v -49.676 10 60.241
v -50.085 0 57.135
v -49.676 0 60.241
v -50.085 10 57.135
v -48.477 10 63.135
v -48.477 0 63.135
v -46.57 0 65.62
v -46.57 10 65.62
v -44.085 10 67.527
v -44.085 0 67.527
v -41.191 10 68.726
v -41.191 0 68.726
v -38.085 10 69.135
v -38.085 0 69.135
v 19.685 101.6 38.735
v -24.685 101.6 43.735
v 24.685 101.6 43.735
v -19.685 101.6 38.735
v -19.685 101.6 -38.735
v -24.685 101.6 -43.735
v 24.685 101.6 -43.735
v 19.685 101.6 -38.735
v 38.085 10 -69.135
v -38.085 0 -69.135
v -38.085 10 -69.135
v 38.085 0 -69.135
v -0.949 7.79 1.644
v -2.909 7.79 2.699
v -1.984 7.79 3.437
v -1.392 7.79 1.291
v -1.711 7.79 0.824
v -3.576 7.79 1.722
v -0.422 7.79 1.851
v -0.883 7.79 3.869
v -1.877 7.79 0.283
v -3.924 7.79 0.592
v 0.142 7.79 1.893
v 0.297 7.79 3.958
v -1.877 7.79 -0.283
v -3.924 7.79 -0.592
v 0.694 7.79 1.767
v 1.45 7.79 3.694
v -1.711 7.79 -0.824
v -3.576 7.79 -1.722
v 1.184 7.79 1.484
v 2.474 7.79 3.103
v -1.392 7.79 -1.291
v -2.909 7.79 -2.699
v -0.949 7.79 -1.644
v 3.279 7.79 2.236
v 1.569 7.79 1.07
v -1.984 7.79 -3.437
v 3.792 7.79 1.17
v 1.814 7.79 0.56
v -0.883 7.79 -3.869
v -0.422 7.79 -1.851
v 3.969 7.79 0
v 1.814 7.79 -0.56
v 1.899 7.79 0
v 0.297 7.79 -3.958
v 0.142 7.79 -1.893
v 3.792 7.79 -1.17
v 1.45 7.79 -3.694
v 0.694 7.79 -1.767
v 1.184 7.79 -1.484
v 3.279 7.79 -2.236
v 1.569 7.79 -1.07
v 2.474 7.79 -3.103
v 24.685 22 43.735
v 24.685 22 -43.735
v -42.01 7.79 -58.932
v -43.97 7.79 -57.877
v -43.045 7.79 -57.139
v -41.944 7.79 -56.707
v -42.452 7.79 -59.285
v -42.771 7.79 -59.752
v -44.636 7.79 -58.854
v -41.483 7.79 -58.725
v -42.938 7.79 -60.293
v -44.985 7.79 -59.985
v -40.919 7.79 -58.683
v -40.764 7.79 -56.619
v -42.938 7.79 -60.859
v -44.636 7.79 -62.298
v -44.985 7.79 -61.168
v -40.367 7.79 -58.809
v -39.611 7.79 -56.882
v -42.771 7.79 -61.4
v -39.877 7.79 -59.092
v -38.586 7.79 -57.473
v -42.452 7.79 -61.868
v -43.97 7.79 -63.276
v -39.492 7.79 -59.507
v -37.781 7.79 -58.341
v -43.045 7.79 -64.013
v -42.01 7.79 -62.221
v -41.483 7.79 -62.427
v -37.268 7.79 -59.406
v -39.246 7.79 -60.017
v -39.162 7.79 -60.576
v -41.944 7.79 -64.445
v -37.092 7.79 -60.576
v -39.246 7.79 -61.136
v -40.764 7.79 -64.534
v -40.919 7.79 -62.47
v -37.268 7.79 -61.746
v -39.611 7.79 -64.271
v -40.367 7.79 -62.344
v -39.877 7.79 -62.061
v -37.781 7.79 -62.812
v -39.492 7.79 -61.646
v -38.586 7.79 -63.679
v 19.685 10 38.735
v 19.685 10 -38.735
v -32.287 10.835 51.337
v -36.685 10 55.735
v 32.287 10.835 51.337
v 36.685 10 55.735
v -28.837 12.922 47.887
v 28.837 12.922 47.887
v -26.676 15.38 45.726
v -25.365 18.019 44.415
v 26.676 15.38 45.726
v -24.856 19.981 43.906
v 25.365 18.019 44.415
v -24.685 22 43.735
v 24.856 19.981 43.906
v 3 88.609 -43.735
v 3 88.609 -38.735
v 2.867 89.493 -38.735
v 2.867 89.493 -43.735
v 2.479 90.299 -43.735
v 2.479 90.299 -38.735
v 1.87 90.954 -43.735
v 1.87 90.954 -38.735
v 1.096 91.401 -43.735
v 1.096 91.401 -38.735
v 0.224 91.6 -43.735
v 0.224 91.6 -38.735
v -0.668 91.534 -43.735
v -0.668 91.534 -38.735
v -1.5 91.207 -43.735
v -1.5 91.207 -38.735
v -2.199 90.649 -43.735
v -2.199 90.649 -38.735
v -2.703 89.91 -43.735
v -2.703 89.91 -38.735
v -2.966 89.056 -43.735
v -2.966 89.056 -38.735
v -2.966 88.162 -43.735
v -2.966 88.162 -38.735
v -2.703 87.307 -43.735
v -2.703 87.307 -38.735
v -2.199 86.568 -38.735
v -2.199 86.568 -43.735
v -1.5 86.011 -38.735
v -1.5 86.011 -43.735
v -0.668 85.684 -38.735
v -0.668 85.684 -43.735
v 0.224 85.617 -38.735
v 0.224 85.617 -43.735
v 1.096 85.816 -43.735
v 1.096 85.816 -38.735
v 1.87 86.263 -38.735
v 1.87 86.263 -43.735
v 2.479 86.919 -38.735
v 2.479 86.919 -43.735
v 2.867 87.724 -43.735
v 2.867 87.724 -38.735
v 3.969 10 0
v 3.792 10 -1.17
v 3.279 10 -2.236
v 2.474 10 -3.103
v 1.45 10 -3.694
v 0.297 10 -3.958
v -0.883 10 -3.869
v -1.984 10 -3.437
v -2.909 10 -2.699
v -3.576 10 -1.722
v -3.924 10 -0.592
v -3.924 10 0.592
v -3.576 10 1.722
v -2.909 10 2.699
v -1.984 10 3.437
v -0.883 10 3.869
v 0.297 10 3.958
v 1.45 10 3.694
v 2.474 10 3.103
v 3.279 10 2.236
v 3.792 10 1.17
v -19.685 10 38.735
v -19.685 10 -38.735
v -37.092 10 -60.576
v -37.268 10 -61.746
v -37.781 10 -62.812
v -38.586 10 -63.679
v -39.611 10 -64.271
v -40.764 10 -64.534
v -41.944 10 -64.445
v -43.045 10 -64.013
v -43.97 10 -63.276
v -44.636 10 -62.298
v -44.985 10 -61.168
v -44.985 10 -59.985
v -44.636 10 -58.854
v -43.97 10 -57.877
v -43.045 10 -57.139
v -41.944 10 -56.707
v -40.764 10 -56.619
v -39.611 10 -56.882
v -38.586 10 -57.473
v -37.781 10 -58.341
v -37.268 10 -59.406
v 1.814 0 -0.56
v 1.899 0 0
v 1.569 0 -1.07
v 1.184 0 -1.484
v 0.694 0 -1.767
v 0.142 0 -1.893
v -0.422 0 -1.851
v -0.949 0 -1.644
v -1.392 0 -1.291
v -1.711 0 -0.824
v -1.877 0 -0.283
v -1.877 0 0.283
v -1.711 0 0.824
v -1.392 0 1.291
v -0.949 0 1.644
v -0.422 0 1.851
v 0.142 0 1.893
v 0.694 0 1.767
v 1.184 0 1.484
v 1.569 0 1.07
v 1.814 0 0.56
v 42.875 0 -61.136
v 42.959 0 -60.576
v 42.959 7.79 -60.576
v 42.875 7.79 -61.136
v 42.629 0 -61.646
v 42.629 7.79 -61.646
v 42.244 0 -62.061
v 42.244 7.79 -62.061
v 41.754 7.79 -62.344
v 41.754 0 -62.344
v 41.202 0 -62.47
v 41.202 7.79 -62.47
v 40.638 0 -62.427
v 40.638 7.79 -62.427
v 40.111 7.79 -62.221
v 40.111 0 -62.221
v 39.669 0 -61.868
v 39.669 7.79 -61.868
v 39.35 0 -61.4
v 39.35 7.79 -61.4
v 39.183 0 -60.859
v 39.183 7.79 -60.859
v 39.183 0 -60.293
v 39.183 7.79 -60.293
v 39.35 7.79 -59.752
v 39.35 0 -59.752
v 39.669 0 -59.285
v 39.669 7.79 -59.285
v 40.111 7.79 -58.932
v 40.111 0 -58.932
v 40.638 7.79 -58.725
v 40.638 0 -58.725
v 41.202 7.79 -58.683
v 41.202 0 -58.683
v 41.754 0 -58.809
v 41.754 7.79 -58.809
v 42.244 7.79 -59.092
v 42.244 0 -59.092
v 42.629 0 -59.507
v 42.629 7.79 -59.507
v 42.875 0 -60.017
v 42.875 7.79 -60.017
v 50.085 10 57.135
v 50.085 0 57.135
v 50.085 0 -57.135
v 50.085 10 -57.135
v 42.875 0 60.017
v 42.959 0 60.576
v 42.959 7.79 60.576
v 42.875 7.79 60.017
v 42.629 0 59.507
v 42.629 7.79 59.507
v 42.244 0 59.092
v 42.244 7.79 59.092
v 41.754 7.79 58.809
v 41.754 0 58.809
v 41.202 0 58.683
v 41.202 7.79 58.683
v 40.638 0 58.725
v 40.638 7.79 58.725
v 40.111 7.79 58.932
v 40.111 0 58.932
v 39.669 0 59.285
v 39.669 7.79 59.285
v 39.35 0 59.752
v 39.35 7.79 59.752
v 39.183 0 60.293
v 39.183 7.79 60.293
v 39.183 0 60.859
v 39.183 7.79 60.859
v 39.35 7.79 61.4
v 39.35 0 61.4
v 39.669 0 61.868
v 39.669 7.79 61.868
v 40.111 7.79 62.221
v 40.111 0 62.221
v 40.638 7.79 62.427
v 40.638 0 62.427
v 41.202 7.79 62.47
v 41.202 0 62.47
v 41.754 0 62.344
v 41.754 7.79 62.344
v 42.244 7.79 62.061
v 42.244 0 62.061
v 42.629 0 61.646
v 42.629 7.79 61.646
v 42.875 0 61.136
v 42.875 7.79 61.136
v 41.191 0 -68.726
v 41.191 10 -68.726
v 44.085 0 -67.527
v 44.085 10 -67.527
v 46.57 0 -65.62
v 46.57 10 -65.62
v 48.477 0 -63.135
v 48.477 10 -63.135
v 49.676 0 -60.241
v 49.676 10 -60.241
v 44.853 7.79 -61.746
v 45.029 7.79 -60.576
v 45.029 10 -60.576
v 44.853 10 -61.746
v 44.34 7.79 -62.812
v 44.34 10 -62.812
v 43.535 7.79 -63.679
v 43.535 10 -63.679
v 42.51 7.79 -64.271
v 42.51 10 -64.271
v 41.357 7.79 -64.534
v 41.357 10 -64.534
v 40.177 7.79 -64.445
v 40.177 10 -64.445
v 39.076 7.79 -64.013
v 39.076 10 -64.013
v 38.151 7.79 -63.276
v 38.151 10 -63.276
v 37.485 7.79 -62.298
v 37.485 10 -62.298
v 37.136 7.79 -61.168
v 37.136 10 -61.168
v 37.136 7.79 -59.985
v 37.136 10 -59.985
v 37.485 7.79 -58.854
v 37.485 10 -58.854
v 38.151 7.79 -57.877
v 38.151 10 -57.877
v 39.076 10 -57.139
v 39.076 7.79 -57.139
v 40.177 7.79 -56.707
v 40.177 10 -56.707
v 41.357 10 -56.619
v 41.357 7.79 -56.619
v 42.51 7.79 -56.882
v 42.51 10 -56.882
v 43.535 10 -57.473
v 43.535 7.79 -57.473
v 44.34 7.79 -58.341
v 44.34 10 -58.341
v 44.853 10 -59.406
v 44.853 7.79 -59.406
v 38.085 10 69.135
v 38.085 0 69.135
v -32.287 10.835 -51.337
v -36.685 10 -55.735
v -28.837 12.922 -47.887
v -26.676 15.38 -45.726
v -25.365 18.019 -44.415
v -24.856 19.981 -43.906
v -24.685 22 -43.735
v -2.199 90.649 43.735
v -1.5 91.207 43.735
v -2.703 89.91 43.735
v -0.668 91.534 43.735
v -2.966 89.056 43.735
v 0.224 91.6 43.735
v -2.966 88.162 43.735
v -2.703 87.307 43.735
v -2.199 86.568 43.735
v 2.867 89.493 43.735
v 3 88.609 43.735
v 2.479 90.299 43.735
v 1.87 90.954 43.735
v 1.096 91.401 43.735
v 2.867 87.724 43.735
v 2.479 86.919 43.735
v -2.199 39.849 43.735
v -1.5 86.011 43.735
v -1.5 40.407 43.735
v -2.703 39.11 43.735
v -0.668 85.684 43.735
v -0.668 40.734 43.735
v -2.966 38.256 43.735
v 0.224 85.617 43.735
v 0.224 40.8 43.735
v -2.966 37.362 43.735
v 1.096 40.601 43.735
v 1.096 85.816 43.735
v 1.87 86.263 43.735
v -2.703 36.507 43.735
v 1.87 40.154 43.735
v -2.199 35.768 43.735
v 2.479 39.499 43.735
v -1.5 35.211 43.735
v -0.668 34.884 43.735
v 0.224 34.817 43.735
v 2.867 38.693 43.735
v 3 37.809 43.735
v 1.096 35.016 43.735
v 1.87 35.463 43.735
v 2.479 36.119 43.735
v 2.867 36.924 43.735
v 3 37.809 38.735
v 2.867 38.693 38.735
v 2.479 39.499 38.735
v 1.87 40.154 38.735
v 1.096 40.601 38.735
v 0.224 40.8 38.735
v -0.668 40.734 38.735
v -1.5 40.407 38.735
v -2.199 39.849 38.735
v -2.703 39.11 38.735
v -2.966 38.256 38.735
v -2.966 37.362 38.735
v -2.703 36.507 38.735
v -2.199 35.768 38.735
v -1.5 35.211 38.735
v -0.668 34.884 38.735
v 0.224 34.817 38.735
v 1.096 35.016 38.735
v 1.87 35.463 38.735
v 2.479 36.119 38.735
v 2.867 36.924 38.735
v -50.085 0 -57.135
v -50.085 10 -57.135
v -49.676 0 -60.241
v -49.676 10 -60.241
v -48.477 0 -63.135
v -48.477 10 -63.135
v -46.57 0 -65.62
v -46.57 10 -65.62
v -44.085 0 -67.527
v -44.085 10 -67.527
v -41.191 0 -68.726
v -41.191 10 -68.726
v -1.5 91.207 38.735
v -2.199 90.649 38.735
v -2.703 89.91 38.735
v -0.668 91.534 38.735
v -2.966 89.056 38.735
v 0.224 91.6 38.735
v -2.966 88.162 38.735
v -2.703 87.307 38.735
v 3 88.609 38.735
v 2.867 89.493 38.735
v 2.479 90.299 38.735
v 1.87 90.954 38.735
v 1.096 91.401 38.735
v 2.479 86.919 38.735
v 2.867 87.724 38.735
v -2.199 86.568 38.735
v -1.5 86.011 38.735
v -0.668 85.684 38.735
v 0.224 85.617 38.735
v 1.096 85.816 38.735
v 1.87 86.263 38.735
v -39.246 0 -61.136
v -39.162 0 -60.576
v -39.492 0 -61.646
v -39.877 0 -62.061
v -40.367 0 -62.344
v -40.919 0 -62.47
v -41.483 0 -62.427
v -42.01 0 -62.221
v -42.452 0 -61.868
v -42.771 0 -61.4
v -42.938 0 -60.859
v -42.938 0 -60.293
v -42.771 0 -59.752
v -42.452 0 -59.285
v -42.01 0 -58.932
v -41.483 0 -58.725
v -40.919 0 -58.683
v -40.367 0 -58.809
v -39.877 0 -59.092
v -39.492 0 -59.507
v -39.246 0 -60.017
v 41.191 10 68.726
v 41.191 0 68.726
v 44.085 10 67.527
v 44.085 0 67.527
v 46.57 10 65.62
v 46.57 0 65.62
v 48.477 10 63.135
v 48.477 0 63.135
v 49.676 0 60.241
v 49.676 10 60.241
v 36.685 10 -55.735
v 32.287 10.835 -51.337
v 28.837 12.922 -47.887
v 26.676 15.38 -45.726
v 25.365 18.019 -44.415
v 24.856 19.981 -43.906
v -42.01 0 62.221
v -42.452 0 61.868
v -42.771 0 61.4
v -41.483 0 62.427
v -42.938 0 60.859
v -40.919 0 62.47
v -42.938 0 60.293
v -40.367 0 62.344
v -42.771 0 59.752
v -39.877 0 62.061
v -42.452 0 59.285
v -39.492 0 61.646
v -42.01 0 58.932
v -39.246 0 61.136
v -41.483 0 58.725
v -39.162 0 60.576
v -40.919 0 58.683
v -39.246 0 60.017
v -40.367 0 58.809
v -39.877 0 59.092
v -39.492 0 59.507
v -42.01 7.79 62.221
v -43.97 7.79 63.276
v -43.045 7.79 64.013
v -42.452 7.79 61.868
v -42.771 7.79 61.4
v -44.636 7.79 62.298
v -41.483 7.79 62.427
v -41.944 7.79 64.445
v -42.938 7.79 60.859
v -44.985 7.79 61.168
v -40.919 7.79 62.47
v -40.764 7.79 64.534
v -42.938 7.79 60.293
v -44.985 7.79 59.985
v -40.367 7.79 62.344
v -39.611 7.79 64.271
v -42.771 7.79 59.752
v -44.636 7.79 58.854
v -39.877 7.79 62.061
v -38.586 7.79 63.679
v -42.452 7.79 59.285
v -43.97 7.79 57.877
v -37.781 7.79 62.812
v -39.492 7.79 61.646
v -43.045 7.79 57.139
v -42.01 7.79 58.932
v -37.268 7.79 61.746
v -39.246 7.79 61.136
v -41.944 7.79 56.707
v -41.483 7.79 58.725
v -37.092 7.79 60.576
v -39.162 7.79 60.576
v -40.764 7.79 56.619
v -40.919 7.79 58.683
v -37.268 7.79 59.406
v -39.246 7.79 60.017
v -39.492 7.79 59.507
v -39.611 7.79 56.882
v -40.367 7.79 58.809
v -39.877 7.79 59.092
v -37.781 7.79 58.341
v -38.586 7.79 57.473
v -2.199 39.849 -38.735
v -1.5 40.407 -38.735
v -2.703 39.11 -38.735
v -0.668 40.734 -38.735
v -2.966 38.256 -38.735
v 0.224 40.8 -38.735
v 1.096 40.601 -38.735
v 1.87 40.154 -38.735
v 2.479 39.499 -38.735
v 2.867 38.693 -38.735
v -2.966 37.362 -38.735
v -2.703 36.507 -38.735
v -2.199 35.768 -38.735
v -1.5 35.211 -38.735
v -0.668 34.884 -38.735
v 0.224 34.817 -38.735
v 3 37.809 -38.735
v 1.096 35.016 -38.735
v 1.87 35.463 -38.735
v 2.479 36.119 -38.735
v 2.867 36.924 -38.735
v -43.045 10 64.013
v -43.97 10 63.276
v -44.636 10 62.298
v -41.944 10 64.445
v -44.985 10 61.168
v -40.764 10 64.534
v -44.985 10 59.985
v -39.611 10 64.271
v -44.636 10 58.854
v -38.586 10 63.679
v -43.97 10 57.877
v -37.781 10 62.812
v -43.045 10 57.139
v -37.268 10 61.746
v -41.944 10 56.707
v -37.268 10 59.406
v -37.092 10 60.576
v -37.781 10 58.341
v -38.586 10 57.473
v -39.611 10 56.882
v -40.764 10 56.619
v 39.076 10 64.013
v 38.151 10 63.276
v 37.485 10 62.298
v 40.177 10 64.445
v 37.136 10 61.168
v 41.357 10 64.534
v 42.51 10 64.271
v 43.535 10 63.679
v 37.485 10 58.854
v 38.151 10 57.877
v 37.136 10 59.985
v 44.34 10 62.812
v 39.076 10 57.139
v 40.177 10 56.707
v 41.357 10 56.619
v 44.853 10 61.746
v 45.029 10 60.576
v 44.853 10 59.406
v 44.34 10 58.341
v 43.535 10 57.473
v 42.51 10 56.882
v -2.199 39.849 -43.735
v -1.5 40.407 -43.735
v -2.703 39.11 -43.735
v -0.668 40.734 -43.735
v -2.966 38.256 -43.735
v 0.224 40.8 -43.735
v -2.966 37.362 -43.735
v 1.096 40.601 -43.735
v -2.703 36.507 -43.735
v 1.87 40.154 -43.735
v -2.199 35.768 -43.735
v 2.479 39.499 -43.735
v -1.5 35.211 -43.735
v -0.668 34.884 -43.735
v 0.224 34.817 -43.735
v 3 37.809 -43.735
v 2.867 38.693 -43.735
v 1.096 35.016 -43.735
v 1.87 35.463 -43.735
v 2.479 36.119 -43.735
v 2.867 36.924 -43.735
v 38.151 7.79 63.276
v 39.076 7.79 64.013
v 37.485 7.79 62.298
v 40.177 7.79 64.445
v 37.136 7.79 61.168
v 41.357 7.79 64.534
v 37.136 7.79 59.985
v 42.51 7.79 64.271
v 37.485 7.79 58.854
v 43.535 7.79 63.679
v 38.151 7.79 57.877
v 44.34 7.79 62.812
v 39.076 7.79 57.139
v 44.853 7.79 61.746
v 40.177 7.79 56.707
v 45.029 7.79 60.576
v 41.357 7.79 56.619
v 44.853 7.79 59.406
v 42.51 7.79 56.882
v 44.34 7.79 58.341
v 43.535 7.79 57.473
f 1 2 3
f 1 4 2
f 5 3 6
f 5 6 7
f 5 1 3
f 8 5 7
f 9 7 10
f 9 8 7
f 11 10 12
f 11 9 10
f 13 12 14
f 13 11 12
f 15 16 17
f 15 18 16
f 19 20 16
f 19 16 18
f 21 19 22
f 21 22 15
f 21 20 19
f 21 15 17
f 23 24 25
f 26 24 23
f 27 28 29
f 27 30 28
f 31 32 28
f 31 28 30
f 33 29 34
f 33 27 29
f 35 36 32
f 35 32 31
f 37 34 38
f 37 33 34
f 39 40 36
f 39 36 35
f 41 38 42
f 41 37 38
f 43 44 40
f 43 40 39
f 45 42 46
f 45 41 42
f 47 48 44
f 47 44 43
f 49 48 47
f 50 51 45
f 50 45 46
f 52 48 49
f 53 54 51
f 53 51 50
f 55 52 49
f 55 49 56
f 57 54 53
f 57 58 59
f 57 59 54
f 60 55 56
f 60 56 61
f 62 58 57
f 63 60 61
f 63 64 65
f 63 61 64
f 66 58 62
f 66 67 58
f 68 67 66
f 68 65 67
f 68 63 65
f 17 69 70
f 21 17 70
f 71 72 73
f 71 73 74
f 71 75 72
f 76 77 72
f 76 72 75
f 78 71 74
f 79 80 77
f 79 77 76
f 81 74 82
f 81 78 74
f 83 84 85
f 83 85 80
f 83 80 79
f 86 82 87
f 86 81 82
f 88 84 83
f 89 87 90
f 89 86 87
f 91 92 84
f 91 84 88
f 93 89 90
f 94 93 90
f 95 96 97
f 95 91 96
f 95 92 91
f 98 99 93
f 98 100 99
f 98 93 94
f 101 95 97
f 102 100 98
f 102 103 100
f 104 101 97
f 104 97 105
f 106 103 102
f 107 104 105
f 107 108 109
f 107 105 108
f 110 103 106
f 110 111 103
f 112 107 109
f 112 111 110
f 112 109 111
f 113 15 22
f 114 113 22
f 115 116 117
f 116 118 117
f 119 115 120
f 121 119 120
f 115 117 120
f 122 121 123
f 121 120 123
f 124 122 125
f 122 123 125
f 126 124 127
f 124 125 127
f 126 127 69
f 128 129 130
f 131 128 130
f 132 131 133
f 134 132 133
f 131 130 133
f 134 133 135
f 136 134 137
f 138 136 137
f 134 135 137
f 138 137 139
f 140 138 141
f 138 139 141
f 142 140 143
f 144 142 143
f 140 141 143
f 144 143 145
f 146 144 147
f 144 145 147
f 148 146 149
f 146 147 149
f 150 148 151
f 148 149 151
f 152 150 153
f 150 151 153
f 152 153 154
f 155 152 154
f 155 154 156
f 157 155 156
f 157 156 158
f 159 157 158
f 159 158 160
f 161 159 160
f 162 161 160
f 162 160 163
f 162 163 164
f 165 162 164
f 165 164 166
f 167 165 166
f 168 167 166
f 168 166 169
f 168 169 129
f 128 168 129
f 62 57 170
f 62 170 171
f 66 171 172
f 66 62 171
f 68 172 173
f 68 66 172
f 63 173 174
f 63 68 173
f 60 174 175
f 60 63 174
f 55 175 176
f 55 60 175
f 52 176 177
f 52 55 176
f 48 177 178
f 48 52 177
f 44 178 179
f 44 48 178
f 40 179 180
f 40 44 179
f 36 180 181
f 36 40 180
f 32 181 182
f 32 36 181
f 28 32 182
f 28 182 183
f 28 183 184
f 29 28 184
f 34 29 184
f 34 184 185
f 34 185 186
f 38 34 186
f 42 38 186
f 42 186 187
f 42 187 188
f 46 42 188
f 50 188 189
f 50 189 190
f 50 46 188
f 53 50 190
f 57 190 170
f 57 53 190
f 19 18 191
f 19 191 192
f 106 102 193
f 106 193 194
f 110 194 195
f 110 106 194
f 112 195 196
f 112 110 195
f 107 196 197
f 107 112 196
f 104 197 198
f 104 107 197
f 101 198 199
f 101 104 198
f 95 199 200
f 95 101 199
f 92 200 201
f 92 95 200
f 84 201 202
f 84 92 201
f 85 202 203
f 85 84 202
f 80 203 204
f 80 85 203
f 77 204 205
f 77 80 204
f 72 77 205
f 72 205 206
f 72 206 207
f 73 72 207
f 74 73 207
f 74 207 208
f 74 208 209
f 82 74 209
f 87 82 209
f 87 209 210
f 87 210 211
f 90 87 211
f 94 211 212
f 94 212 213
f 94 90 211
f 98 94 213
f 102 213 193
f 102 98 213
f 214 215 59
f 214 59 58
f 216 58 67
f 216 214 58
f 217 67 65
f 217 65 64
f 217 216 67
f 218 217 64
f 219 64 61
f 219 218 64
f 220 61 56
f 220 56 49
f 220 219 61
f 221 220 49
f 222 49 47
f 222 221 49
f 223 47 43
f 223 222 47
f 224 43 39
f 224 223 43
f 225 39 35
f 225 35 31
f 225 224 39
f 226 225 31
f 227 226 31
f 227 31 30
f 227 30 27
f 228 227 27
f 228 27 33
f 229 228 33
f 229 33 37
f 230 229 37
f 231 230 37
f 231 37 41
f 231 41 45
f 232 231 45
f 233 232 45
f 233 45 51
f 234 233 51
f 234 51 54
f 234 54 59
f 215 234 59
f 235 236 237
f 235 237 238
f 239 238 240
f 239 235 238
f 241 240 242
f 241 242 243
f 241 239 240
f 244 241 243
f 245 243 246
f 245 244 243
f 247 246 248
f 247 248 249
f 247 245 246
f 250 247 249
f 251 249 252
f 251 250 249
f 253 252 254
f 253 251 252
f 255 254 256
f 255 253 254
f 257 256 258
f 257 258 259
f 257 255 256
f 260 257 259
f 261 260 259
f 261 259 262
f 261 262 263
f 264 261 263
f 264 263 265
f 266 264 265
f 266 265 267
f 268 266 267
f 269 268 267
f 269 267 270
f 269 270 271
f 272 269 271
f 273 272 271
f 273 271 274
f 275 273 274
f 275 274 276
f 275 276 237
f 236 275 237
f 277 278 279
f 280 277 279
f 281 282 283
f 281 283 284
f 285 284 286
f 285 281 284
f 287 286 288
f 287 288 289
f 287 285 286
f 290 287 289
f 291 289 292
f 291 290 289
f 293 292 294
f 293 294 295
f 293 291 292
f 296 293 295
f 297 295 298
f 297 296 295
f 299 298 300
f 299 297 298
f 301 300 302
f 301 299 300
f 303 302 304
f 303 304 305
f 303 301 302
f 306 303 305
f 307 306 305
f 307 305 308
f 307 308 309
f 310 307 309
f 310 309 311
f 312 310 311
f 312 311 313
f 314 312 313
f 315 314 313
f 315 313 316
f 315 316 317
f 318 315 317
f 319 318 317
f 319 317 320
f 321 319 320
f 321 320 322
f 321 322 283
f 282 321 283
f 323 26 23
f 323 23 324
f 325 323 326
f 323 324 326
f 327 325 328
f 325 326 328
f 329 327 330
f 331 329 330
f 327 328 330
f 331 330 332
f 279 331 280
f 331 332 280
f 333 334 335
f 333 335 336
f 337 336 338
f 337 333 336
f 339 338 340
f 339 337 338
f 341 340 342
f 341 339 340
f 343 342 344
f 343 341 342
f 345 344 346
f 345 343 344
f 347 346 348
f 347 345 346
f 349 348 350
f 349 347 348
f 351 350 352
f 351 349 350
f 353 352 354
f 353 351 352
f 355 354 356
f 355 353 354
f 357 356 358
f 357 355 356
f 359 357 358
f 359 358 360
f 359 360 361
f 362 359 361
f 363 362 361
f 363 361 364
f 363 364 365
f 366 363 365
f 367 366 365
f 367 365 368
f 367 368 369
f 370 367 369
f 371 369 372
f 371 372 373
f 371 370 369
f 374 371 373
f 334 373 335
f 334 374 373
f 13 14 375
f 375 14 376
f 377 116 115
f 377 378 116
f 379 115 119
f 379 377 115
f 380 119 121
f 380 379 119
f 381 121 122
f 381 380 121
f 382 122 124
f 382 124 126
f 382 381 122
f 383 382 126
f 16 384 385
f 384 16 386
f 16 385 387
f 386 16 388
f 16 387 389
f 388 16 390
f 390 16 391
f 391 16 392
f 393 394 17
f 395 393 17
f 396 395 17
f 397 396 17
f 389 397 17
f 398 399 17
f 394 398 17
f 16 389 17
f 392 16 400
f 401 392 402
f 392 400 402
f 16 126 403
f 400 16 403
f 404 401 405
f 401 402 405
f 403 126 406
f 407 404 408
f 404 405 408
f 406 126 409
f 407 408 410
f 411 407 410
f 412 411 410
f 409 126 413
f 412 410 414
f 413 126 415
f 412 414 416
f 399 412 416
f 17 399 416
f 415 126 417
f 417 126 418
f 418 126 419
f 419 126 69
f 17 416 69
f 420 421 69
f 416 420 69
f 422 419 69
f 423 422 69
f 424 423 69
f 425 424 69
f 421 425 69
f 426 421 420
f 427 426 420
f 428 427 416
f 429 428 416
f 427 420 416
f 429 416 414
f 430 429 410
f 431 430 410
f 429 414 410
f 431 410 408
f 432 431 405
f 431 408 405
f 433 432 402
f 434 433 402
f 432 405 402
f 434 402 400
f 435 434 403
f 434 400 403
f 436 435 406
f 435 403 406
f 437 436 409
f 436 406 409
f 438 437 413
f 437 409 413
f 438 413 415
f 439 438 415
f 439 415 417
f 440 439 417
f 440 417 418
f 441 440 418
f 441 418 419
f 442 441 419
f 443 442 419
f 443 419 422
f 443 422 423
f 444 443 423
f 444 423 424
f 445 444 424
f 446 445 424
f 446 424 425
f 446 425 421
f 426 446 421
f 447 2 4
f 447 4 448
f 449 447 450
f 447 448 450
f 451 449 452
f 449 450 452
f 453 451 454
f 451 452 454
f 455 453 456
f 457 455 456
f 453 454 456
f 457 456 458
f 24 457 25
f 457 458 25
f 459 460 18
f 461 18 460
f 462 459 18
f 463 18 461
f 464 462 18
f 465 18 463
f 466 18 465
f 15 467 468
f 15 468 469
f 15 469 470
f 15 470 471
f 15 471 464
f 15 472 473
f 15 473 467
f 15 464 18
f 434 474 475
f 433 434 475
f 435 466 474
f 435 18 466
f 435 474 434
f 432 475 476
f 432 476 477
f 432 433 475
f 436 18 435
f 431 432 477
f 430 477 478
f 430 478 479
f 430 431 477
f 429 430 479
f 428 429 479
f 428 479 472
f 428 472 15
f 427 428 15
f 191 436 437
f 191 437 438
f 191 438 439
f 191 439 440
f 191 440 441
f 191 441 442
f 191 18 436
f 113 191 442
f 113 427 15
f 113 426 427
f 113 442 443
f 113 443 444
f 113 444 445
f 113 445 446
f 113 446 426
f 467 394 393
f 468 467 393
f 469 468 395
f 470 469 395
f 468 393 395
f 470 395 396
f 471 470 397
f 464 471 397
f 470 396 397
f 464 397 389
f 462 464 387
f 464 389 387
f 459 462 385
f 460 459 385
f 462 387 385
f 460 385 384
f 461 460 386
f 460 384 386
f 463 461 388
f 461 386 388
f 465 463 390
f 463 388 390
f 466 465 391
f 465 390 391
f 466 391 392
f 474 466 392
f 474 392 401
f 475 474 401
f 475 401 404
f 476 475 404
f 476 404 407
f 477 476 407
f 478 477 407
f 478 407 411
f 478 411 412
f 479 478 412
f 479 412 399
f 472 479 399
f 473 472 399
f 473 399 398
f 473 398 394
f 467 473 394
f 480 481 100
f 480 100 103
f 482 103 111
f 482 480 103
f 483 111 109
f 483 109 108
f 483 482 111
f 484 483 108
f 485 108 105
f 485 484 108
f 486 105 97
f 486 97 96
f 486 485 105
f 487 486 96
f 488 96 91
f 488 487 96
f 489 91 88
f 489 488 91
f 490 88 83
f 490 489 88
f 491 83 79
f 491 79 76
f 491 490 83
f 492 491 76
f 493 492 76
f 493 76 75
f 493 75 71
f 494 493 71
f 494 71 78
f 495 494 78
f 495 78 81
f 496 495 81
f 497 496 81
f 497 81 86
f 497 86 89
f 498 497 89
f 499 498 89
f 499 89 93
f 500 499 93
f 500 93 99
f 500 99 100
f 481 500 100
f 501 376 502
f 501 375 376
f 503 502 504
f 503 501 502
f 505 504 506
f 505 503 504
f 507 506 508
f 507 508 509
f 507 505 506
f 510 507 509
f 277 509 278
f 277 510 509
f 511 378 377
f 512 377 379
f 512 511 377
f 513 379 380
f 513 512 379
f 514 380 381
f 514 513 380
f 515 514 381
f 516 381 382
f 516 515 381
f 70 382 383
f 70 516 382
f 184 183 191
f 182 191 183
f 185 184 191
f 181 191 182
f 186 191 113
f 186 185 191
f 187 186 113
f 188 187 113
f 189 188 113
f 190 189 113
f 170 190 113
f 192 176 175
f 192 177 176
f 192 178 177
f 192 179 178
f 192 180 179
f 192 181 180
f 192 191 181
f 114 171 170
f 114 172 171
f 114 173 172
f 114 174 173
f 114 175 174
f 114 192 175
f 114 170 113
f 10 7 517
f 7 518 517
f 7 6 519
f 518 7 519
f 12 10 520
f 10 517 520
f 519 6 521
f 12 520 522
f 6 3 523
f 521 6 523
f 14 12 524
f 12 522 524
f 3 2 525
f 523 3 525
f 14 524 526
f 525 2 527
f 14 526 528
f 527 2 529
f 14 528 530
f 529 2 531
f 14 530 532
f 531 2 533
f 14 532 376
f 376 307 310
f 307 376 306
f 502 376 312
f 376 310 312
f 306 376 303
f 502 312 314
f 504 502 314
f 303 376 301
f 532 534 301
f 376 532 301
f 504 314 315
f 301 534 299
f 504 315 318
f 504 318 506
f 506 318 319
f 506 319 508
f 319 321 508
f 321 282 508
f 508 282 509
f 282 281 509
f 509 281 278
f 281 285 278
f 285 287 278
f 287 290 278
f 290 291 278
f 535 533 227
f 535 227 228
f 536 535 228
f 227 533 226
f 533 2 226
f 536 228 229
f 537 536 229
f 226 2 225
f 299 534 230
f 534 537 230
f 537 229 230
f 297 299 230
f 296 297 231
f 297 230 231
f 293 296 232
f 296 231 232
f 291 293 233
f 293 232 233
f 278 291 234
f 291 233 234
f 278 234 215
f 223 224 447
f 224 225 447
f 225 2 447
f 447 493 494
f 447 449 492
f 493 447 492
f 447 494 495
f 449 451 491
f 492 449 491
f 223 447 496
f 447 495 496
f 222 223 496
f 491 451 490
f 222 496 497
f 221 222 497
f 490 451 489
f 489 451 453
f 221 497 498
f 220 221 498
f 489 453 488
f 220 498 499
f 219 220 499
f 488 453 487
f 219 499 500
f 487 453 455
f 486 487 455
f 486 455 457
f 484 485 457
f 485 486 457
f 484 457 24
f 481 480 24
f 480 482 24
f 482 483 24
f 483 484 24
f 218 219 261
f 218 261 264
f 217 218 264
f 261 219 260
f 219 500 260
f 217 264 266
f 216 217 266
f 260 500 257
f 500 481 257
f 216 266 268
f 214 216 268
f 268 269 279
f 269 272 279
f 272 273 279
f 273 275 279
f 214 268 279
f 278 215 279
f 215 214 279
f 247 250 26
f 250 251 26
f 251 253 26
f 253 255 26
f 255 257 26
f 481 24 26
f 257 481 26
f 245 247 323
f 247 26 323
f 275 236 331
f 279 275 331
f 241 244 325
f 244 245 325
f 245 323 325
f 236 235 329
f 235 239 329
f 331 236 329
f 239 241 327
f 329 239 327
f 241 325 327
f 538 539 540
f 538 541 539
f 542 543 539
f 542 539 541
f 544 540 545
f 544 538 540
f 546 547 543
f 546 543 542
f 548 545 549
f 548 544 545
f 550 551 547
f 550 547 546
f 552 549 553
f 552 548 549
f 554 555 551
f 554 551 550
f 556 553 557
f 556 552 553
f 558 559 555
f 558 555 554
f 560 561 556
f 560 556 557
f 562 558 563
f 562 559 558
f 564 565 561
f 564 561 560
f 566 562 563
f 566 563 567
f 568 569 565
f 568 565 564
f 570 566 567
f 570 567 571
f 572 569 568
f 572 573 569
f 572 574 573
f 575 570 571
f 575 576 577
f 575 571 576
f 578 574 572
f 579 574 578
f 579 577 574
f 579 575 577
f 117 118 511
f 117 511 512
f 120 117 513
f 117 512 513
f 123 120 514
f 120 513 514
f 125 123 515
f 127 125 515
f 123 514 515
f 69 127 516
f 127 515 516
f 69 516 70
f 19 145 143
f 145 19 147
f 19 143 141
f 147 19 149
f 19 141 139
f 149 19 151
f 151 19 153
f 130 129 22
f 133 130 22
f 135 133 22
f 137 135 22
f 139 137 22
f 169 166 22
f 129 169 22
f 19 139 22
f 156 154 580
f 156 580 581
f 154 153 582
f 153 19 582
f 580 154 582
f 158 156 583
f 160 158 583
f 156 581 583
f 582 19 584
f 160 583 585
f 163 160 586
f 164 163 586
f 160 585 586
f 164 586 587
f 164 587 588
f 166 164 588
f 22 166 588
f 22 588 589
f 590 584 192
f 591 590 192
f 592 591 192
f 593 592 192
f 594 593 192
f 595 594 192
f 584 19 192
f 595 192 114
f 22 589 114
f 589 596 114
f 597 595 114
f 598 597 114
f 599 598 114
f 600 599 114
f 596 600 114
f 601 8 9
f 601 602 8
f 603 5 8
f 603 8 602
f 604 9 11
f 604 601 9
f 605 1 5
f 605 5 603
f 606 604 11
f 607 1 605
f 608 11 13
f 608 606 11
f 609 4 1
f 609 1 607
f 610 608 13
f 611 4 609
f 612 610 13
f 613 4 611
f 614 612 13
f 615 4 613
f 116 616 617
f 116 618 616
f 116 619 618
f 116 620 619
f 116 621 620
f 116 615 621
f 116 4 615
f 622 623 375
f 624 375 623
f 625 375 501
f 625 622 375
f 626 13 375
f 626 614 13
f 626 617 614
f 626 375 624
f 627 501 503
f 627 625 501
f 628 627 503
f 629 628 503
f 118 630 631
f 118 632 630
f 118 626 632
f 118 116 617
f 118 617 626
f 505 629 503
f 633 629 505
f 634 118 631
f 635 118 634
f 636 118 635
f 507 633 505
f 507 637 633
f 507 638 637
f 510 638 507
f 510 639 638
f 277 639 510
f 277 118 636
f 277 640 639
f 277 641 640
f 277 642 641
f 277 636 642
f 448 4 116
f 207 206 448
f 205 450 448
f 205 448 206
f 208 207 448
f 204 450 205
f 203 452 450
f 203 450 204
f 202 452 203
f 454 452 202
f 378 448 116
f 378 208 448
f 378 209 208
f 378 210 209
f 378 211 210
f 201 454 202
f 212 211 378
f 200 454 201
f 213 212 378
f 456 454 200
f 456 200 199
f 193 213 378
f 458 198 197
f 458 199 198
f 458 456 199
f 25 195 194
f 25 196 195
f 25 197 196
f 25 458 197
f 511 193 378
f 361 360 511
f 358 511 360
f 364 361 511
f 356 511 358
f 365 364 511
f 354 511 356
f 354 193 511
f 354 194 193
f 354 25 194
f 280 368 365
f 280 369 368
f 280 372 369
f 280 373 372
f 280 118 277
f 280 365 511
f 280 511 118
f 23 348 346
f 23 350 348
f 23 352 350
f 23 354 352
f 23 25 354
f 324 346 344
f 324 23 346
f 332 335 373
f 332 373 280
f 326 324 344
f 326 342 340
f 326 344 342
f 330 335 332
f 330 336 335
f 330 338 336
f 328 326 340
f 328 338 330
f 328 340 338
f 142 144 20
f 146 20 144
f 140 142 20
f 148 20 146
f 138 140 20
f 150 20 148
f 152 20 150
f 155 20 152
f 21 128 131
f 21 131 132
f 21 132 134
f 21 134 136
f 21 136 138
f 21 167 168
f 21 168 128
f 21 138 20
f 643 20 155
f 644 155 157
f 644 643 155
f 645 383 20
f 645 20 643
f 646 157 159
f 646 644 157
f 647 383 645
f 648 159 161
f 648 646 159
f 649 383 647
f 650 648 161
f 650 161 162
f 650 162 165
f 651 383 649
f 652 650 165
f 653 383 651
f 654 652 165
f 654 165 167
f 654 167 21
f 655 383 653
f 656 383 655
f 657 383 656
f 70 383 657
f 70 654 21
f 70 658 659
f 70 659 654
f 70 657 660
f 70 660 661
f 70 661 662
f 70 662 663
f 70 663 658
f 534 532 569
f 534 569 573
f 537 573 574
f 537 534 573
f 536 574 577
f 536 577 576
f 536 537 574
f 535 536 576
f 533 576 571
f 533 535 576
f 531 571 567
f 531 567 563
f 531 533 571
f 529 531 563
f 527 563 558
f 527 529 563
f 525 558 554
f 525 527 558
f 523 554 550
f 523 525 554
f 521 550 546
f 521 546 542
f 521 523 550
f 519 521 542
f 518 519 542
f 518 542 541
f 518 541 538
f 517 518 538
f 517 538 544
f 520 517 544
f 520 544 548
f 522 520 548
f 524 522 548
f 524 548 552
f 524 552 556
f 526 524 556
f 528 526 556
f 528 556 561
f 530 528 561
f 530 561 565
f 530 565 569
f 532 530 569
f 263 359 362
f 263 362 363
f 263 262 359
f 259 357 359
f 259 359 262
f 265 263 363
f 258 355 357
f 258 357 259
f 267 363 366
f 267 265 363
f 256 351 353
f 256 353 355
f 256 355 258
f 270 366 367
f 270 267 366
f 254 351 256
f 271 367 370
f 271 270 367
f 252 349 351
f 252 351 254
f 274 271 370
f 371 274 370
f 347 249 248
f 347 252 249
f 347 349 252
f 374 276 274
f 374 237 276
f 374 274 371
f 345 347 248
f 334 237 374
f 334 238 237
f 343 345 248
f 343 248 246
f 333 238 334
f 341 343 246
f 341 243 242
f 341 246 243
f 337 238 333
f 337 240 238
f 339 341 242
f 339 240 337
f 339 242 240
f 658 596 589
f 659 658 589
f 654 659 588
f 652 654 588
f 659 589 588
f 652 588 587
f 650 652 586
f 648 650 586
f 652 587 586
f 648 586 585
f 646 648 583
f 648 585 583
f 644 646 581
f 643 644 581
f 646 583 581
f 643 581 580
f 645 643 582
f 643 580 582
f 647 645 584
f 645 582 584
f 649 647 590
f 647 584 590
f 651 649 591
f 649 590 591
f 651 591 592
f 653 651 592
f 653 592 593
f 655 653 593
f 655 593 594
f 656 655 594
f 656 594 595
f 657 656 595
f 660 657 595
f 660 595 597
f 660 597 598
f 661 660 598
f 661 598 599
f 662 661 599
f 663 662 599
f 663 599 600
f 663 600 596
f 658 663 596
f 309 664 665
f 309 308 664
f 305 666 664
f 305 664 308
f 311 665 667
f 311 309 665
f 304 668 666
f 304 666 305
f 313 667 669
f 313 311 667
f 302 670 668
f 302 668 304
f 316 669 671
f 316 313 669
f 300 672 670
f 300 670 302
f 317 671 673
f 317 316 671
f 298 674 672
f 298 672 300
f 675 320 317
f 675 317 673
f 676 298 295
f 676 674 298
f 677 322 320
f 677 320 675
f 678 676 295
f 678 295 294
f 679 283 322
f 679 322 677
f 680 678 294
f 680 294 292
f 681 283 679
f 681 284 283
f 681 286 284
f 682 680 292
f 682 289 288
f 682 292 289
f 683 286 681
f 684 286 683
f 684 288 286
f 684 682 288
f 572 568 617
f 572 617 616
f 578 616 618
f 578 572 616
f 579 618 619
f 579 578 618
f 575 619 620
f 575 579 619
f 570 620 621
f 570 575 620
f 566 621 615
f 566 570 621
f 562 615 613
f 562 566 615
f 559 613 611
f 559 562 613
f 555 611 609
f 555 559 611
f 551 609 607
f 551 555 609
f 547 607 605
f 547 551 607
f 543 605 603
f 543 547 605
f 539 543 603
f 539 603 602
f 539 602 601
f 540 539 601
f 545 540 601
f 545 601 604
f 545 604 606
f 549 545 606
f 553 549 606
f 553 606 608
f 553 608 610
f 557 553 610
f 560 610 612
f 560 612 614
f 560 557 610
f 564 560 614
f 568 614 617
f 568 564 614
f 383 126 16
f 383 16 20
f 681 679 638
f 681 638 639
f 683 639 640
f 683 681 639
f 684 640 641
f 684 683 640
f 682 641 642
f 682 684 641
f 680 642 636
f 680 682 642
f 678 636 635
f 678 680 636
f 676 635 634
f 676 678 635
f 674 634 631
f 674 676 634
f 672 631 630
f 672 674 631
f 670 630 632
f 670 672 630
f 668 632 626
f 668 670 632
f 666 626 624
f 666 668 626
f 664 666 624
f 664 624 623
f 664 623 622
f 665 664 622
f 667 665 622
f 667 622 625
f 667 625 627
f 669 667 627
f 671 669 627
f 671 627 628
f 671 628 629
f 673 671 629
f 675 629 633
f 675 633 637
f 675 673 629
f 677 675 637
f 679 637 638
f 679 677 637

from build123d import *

# Parameters (mm, degrees)
SKETCH1_W                                     = 49.37
SKETCH1_H                                     = 87.47
SKETCH1_W_2                                   = 39.37
SKETCH1_H_2                                   = 77.47
BOSS_EXTRUDE1_DEPTH                           = 101.6
SKETCH2_W                                     = 100.17
SKETCH2_H                                     = 138.27
BOSS_EXTRUDE2_DEPTH                           = 10
FILLET1_R                                     = 12
CBORE_FOR_6_BINDING_HEAD_MACHINE_SC_2_R       = 1.89865
CBORE_FOR_6_BINDING_HEAD_MACHINE_SCREW2_DEPTH = 10
CBORE_START                                   = 7.7902
CBORE_FOR_6_BINDING_HEAD_MACHINE_SC_3_O_R     = 3.96875
CBORE_FOR_6_BINDING_HEAD_MACHINE_SC_3_O_R_2   = 1.89865
CBORE_FOR_6_BINDING_HEAD_MACHINE_SC_3_DEPTH   = 2.2098
FILLET2_R                                     = 12
SKETCH9_R                                     = 3
CUT_EXTRUDE1_DEPTH                            = 160.908424184


# Read off the part's stored shape, not the designer's step: CBORE for #6 Binding Head Machine Screw2
with BuildPart() as part:
    # Sketch1 → Boss-Extrude1 (new body)
    with BuildSketch(Plane(origin=(0, 0, 0), x_dir=(1, 0, 0), z_dir=(0, 1, 0))):
        Rectangle(SKETCH1_W, SKETCH1_H)
        Rectangle(SKETCH1_W_2, SKETCH1_H_2, mode=Mode.SUBTRACT)
    extrude(amount=BOSS_EXTRUDE1_DEPTH)

    # Sketch2 → Boss-Extrude2 (add)
    with BuildSketch(Plane(origin=(0, 0, 0), x_dir=(1, 0, 0), z_dir=(0, 1, 0))):
        Rectangle(SKETCH2_W, SKETCH2_H)
    extrude(amount=BOSS_EXTRUDE2_DEPTH)

    # Fillet1
    fillet1_edges = [part.edges().sort_by_distance(p)[0] for p in [
        (0, 10, -43.735),
        (24.685, 10, 0),
        (0, 10, 43.735),
        (-24.685, 10, 0),
    ]]
    fillet(fillet1_edges, radius=FILLET1_R)

    # CBORE for _6 Binding Head Machine Sc 2 → CBORE for #6 Binding Head Machine Screw2 (cut)
    with BuildSketch(Plane(origin=(0, 0, 0), x_dir=(1, 0, 0), z_dir=(0, 1, 0))):
        with Locations((41.060456563, -60.576250035)):
            Circle(CBORE_FOR_6_BINDING_HEAD_MACHINE_SC_2_R)
        with Locations((-41.060456563, 60.576250035)):
            Circle(CBORE_FOR_6_BINDING_HEAD_MACHINE_SC_2_R)
        with Locations((-41.060456563, -60.576250035)):
            Circle(CBORE_FOR_6_BINDING_HEAD_MACHINE_SC_2_R)
        with Locations((41.060456563, 60.576250035)):
            Circle(CBORE_FOR_6_BINDING_HEAD_MACHINE_SC_2_R)
        Circle(CBORE_FOR_6_BINDING_HEAD_MACHINE_SC_2_R)
    extrude(amount=CBORE_FOR_6_BINDING_HEAD_MACHINE_SCREW2_DEPTH, mode=Mode.SUBTRACT)

    # CBORE for _6 Binding Head Machine Sc 3 o → CBORE for _6 Binding Head Machine Sc 3 (cut)
    # profile 1 of 5: a face of its own
    with BuildSketch(Plane(origin=(0, 0, 0), x_dir=(1, 0, 0), z_dir=(0, 1, 0)).offset(CBORE_START)):
        with Locations((41.060456563, -60.576250035)):
            Circle(CBORE_FOR_6_BINDING_HEAD_MACHINE_SC_3_O_R)
        with Locations((41.060456563, -60.576250035)):
            Circle(CBORE_FOR_6_BINDING_HEAD_MACHINE_SC_3_O_R_2, mode=Mode.SUBTRACT)
    # profile 2 of 5: a face of its own
    with BuildSketch(Plane(origin=(0, 0, 0), x_dir=(1, 0, 0), z_dir=(0, 1, 0)).offset(CBORE_START)):
        with Locations((-41.060456563, 60.576250035)):
            Circle(CBORE_FOR_6_BINDING_HEAD_MACHINE_SC_3_O_R)
        with Locations((-41.060456563, 60.576250035)):
            Circle(CBORE_FOR_6_BINDING_HEAD_MACHINE_SC_3_O_R_2, mode=Mode.SUBTRACT)
    # profile 3 of 5: a face of its own
    with BuildSketch(Plane(origin=(0, 0, 0), x_dir=(1, 0, 0), z_dir=(0, 1, 0)).offset(CBORE_START)):
        with Locations((-41.060456563, -60.576250035)):
            Circle(CBORE_FOR_6_BINDING_HEAD_MACHINE_SC_3_O_R)
        with Locations((-41.060456563, -60.576250035)):
            Circle(CBORE_FOR_6_BINDING_HEAD_MACHINE_SC_3_O_R_2, mode=Mode.SUBTRACT)
    # profile 4 of 5: a face of its own
    with BuildSketch(Plane(origin=(0, 0, 0), x_dir=(1, 0, 0), z_dir=(0, 1, 0)).offset(CBORE_START)):
        with Locations((41.060456563, 60.576250035)):
            Circle(CBORE_FOR_6_BINDING_HEAD_MACHINE_SC_3_O_R)
        with Locations((41.060456563, 60.576250035)):
            Circle(CBORE_FOR_6_BINDING_HEAD_MACHINE_SC_3_O_R_2, mode=Mode.SUBTRACT)
    # profile 5 of 5: a face of its own
    with BuildSketch(Plane(origin=(0, 0, 0), x_dir=(1, 0, 0), z_dir=(0, 1, 0)).offset(CBORE_START)):
        Circle(CBORE_FOR_6_BINDING_HEAD_MACHINE_SC_3_O_R)
        Circle(CBORE_FOR_6_BINDING_HEAD_MACHINE_SC_3_O_R_2, mode=Mode.SUBTRACT)
    extrude(amount=CBORE_FOR_6_BINDING_HEAD_MACHINE_SC_3_DEPTH, mode=Mode.SUBTRACT)

    # Fillet2
    fillet2_edges = [part.edges().sort_by_distance(p)[0] for p in [
        (50.085, 5, 69.135),
        (50.085, 5, -69.135),
        (-50.085, 5, -69.135),
        (-50.085, 5, 69.135),
    ]]
    fillet(fillet2_edges, radius=FILLET2_R)

    # Sketch9 → Cut-Extrude1 (cut, through all)
    with BuildSketch(Plane.XY.offset(43.735)):
        with Locations((0, 88.608727906)):
            Circle(SKETCH9_R)
        with Locations((0, 37.808727906)):
            Circle(SKETCH9_R)
    extrude(amount=-CUT_EXTRUDE1_DEPTH, mode=Mode.SUBTRACT)


solid = part.part
